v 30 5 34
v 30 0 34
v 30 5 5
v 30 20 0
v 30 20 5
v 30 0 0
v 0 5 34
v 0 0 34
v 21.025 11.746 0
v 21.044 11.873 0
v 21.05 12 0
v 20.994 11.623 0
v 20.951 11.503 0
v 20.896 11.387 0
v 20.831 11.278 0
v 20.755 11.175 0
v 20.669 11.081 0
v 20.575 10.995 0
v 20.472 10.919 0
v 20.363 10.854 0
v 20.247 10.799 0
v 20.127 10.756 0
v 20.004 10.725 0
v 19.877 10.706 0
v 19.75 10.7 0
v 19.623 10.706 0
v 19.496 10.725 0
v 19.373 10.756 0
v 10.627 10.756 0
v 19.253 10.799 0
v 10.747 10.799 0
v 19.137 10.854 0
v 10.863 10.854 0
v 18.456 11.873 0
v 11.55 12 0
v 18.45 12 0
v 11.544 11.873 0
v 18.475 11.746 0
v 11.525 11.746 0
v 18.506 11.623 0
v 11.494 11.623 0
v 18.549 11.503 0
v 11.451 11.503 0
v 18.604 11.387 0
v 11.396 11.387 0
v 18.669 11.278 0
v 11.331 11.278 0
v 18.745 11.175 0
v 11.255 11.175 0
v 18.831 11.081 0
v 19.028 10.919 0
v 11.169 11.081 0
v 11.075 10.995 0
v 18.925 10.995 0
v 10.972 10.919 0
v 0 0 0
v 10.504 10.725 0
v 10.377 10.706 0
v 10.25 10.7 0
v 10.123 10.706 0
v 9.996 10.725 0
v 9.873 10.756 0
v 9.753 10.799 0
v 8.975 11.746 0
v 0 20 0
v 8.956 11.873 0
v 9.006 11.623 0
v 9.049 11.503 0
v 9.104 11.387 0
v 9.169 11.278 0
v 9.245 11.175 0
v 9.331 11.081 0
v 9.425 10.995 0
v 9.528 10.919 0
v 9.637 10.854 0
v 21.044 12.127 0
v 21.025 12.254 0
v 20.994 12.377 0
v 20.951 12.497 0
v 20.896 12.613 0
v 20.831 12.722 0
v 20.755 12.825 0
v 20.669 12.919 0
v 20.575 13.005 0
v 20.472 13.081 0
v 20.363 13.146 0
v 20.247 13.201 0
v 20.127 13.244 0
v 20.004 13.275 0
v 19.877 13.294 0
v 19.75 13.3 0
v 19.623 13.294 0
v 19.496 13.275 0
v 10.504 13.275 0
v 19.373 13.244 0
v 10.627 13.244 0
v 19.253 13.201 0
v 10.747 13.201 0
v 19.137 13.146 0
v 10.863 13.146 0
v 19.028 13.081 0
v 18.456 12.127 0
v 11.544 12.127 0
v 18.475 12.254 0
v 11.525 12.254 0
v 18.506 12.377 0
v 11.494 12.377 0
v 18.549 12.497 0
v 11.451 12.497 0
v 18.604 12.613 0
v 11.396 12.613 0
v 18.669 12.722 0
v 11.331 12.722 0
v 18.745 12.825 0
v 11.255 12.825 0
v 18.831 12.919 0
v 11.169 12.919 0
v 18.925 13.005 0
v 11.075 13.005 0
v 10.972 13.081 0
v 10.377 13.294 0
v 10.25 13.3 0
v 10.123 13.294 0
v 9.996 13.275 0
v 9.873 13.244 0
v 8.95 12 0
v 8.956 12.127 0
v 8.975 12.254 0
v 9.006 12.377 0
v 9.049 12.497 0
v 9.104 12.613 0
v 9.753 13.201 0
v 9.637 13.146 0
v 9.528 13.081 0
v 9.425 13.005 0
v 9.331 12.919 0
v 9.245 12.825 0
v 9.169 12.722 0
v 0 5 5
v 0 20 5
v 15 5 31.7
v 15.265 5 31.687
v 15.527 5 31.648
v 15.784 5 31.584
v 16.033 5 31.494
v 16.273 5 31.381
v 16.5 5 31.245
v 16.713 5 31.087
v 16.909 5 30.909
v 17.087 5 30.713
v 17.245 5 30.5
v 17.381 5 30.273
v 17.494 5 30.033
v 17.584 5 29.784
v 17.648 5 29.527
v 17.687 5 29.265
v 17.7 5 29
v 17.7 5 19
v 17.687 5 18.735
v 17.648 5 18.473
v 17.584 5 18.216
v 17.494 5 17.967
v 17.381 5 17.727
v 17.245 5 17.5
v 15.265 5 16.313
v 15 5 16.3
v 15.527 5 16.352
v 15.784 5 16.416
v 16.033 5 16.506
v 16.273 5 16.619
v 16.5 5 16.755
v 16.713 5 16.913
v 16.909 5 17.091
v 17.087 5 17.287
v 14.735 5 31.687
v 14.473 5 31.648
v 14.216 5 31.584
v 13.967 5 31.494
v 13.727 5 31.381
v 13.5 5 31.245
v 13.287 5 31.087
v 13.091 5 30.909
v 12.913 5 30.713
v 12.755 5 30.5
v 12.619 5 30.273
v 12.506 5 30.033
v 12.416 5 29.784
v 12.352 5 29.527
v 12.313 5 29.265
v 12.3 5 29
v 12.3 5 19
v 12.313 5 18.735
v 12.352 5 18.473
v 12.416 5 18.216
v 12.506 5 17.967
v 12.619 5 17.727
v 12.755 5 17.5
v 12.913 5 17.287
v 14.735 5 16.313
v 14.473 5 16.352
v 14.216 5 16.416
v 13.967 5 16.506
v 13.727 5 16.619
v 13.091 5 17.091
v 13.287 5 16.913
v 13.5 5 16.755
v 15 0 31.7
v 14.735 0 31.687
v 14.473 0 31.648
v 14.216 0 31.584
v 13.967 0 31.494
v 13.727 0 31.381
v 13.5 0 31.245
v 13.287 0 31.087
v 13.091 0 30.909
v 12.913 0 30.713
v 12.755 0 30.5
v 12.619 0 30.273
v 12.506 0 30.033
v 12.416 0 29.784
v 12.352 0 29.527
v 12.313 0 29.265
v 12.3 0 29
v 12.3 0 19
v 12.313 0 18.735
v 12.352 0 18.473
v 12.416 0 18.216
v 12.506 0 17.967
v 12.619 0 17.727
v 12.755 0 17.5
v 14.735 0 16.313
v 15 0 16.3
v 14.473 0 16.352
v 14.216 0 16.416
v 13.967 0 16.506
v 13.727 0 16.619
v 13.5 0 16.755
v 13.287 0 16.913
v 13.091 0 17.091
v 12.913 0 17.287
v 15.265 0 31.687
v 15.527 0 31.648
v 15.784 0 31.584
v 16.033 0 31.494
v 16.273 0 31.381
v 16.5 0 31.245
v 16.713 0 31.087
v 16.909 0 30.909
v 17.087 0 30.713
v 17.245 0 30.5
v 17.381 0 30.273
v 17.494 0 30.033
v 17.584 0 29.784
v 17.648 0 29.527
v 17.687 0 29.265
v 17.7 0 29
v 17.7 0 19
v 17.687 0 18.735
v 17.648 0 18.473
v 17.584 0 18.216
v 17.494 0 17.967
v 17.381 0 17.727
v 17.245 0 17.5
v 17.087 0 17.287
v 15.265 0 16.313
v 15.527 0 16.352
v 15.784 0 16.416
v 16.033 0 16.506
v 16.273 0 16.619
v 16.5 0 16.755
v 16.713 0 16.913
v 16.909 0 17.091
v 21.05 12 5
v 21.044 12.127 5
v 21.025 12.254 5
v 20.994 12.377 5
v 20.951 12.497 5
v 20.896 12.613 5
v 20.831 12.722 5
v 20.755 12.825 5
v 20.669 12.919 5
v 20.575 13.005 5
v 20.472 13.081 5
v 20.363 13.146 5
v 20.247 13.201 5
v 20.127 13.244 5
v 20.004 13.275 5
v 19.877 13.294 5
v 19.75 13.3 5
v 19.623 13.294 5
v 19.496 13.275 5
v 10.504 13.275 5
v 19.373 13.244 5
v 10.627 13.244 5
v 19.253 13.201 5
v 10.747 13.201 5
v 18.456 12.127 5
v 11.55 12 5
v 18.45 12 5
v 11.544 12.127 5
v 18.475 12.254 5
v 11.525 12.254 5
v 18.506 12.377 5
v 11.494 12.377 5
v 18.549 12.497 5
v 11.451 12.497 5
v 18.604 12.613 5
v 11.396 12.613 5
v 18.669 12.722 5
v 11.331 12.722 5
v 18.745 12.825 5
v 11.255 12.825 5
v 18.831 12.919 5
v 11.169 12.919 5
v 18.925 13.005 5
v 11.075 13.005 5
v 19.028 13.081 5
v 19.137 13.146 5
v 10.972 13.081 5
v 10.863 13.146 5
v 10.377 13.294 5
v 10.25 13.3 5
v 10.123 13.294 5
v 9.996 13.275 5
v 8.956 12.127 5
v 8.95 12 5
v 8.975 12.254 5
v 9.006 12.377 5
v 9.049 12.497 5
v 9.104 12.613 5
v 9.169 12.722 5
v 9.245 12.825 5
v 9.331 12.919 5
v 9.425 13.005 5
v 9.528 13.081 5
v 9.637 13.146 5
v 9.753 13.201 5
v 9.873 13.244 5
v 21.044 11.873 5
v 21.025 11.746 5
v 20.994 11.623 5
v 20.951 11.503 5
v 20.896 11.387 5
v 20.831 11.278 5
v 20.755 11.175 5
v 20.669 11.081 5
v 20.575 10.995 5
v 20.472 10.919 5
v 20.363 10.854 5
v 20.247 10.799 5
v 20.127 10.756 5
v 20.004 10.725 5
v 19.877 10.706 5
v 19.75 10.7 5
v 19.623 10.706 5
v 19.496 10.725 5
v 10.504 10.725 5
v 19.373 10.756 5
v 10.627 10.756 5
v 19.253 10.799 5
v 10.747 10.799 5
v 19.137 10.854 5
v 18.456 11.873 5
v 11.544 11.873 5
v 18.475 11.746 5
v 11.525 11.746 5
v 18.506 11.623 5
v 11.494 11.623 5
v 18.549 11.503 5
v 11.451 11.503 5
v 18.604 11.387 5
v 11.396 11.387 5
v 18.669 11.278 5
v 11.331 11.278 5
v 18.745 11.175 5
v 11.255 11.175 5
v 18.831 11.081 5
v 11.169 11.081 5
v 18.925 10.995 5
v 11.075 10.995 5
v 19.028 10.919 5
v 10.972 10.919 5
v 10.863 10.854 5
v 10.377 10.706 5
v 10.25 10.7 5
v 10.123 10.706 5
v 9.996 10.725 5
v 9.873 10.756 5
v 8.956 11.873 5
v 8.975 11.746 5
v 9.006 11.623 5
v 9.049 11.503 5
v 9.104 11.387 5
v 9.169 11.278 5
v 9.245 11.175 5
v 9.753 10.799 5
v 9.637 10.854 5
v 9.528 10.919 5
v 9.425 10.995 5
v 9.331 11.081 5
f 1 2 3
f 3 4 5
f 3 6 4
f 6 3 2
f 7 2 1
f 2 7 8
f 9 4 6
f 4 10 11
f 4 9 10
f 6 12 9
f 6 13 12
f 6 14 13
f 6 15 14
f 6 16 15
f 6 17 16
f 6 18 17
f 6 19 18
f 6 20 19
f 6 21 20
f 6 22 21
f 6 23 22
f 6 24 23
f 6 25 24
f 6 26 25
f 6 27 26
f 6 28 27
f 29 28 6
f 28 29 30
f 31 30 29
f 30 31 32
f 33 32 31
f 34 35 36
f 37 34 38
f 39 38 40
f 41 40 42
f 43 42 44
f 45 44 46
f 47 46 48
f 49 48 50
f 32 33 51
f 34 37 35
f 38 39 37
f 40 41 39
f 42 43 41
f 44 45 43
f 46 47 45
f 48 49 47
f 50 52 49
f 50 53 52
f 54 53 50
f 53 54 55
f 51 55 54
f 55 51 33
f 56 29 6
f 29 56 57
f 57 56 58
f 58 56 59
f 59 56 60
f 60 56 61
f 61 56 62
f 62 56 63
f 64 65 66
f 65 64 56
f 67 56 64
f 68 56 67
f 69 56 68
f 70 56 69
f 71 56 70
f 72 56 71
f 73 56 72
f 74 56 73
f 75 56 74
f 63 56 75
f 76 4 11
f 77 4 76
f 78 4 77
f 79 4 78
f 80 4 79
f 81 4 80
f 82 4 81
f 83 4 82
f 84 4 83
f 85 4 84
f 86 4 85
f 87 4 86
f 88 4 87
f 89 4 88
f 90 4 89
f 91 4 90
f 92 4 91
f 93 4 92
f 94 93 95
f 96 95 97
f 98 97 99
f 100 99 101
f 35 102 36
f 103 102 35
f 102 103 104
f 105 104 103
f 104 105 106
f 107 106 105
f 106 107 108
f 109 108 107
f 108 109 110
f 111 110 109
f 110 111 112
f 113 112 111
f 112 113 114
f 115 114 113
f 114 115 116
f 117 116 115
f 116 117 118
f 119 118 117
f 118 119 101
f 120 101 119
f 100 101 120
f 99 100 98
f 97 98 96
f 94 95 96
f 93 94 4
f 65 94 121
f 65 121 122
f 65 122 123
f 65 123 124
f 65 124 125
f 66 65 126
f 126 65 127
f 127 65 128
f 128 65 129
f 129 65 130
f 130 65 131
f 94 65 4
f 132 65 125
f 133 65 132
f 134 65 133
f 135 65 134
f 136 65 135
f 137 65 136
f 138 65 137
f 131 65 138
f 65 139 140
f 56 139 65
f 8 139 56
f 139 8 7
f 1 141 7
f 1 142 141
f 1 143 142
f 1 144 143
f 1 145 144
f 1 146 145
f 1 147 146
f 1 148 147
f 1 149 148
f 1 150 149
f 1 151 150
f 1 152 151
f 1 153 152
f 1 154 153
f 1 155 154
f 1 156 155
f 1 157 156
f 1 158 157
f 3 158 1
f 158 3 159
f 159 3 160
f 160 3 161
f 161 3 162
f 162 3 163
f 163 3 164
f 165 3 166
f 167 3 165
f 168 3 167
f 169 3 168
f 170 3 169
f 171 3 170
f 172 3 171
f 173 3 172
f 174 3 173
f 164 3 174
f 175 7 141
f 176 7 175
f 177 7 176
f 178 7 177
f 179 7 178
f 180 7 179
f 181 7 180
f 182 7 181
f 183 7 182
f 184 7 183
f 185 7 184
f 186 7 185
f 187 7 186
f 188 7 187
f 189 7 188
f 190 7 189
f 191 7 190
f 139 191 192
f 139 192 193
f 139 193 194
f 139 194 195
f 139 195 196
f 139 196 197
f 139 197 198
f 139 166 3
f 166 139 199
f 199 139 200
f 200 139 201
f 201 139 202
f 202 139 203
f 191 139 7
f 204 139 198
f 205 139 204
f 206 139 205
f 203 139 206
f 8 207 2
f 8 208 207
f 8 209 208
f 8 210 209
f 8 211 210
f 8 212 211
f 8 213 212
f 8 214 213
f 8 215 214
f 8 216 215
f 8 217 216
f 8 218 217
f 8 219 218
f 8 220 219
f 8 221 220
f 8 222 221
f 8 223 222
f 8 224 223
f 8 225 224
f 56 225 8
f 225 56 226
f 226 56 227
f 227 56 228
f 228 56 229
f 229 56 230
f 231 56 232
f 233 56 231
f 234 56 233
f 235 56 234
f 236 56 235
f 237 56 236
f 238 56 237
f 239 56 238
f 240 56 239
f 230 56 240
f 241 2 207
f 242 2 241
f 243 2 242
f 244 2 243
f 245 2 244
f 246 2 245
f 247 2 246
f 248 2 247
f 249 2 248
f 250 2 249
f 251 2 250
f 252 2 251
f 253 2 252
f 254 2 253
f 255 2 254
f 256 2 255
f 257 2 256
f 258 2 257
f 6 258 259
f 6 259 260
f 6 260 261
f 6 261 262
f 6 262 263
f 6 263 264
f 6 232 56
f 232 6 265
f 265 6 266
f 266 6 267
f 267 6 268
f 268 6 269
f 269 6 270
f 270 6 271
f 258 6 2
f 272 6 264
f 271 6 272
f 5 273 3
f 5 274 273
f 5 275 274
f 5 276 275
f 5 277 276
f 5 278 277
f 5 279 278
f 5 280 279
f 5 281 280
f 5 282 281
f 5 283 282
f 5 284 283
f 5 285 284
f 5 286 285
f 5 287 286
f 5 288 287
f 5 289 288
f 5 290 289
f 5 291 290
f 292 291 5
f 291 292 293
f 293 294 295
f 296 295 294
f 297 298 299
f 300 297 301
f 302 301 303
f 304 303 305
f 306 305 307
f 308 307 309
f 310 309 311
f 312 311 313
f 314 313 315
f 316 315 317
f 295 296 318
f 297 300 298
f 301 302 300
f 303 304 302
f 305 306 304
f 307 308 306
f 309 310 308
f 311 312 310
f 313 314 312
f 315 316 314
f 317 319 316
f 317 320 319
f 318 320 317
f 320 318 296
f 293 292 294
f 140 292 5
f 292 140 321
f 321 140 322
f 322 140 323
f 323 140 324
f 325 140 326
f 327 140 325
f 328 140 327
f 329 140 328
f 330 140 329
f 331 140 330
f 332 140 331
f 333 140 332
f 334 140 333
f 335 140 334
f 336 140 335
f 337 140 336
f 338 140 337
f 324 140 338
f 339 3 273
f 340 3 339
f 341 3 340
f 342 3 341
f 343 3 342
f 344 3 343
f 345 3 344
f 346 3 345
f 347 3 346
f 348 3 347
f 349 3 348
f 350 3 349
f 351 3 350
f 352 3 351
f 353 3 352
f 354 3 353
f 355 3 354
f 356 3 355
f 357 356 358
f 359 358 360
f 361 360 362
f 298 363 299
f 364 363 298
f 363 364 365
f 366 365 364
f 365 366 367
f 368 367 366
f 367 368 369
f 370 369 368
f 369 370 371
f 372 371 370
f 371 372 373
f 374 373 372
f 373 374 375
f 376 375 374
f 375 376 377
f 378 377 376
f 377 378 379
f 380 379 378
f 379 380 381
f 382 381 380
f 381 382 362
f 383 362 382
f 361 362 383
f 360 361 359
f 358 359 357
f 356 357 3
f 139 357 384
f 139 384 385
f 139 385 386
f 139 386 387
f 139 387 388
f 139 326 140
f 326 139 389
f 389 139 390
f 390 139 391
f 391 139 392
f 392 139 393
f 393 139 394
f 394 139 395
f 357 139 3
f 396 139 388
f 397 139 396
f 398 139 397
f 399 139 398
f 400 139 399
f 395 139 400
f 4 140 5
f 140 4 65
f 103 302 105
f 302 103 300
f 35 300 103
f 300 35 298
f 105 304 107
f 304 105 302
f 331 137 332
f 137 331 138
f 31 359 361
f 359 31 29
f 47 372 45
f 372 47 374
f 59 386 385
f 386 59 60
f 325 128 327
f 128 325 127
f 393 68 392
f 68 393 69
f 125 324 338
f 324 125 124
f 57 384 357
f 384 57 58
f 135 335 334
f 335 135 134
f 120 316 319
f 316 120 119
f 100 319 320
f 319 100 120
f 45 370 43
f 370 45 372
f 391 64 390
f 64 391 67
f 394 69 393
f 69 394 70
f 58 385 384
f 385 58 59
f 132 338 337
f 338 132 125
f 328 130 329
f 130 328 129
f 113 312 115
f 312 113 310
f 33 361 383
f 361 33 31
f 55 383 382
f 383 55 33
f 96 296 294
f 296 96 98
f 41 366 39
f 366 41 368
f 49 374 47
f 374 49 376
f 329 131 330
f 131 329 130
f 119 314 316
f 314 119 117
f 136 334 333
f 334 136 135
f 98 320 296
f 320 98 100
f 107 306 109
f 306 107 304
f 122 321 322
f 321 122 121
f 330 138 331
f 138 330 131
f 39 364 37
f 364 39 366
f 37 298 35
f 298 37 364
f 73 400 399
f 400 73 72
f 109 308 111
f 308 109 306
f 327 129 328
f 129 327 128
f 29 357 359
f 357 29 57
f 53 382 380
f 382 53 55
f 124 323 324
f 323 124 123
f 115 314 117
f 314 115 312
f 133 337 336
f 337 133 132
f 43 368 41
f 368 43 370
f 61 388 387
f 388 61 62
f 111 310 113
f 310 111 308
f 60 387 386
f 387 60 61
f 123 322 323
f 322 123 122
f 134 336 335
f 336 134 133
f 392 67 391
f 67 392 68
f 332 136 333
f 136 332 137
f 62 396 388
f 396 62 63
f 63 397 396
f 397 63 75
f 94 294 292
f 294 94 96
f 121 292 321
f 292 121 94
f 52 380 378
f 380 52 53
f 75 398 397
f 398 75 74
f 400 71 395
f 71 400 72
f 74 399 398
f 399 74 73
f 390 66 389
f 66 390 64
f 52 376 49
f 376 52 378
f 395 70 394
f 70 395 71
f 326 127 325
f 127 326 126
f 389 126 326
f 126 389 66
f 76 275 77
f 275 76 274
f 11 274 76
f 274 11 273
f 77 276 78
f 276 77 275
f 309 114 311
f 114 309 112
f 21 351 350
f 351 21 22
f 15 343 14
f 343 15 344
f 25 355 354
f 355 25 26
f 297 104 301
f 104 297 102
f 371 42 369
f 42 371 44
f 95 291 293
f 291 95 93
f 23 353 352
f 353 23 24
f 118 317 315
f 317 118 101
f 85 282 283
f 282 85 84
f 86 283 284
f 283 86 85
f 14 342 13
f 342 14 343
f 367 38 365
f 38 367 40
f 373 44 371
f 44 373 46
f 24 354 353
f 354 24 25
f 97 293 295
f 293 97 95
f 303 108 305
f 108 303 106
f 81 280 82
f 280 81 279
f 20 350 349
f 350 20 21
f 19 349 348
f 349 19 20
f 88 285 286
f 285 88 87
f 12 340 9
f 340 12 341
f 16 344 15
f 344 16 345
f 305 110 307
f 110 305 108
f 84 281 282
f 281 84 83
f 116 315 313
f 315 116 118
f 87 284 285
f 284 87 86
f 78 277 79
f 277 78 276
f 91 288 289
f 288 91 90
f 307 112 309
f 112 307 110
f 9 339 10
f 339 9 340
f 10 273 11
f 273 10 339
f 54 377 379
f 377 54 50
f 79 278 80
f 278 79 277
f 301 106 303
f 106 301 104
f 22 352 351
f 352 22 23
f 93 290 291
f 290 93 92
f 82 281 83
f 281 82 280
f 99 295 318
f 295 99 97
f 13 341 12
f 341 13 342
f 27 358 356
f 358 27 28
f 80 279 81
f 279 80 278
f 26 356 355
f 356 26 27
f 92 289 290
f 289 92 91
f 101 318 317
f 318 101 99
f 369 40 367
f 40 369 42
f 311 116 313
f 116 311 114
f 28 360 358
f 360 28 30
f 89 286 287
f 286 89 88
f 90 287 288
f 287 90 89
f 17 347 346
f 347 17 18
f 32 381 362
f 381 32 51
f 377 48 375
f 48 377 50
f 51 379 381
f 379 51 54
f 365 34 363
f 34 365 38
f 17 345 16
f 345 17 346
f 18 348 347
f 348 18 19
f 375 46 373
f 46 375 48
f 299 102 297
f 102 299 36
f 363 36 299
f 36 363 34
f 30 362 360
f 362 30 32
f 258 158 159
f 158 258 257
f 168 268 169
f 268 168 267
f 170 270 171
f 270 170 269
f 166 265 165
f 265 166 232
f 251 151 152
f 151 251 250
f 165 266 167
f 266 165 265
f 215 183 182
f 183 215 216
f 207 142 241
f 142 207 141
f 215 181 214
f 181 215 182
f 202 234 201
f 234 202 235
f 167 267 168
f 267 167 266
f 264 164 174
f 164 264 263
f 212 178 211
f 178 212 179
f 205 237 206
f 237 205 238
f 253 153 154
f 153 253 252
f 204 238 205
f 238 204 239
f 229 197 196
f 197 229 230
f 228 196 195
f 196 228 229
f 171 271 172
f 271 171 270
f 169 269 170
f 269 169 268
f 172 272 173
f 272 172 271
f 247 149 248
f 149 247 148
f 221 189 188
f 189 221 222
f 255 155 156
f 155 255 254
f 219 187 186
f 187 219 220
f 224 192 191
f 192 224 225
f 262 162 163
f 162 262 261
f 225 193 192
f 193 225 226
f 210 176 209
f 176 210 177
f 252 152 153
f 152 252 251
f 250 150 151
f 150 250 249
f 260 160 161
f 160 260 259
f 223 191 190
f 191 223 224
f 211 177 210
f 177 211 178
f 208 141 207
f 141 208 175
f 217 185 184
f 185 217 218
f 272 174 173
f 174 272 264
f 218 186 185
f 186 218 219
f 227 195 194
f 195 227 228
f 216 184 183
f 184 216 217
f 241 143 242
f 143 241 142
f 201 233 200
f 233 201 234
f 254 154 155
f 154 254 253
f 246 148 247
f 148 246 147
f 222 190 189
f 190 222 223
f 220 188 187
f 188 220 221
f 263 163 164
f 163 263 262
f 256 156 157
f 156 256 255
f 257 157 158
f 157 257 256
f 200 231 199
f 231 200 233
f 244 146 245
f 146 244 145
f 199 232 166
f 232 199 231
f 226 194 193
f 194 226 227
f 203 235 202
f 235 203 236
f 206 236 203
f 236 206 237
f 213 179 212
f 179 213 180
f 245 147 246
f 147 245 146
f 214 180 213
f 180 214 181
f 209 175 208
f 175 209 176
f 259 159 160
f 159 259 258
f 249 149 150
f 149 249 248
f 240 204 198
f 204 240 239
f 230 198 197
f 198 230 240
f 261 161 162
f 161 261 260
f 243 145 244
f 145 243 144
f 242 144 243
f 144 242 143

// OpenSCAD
// file: params.scad
// ArtBot - shared parameters for all printed parts. Units: mm.
// Anything tagged VERIFY must be measured against the parts actually ordered
// before you burn filament on a full set.

$fn = 64;
eps = 0.01;

/* ---------- fasteners (clearance holes, not tapped) ---------- */
m2_clear   = 2.4;
m3_clear   = 3.4;
m3_nut_af  = 5.6;   // across flats
m3_nut_t   = 2.6;
m5_clear   = 5.4;
m5_head_d  = 9.6;
m5_head_h  = 5.2;

/* ---------- V-slot extrusion ---------- */
vslot      = 20;    // 2020 face width
vslot_2040 = 40;    // 2040 long face

/* ---------- gantry plate bolt grid ----------
   OpenBuilds Mini-V / Xtreme plates all use a 20 mm M5 grid.
   VERIFY the actual hole positions on the plate you buy - vendors differ
   on WHICH grid holes are present, not on the pitch.                      */
plate_grid = 20;

/* ---------- GT2 belt ---------- */
belt_w      = 6;
belt_pitch  = 2;
belt_back   = 0.80;  // thickness behind the teeth
belt_tooth  = 0.75;  // tooth depth

/* ---------- pen shuttle guide rods ---------- */
rod_d       = 8;
rod_press   = 7.85;  // interference fit in the fixed walls (tune per printer)
rod_slide   = 8.5;   // running clearance in the moving shuttle
rod_spacing = 40;    // centre-to-centre, horizontal
rod_len     = 74;    // cut length. base plate + span + front wall

/* ---------- whiteboard marker ---------- */
pen_d       = 17;    // VERIFY: calliper the barrel of the marker you'll use
pen_clear_d = 24;    // pass-through in the front wall

/* ---------- SG90 servo ----------
   Mount holes are SLOTTED in servo_bracket_sg90.scad on purpose: SG90 clones
   vary by ~1 mm and the throw needs fore/aft trimming at assembly anyway.   */
sg90_len     = 23.0;
sg90_wid     = 12.4;
sg90_hgt     = 22.6;
sg90_tab_span = 32.2;  // screw centre to screw centre
sg90_tab_t    = 2.6;
sg90_screw_d  = 2.4;

/* ---------- limit switch (V-153 / KW12 style lever microswitch) ---------- */
sw_hole_pitch = 9.5;  // VERIFY against your switch
sw_hole_d     = 2.6;
// main file
// ArtBot - limit switch mount for 2020 extrusion. Qty 2 (X-min, Y-min).
// Slotted so you can slide the trigger point during homing setup without
// re-drilling anything.
include <params.scad>

ms_w = 30;
ms_t = 5;
ms_h = 34;

module slot(len, d, h) {
    hull() for (o = [-len/2, len/2]) translate([o, 0, 0]) cylinder(d = d, h = h);
}

difference() {
    union() {
        cube([ms_w, ms_t, ms_h]);
        cube([ms_w, 20, ms_t]);   // switch shelf
    }

    // M5 into the extrusion slot, slotted vertically for position trim
    translate([ms_w/2, -eps, ms_h - 10]) rotate([-90, 0, 0])
        rotate([0, 0, 90]) slot(10, m5_clear, ms_t + 2*eps);

    // switch screws
    for (x = [ms_w/2 - sw_hole_pitch/2, ms_w/2 + sw_hole_pitch/2])
        translate([x, 12, -eps]) cylinder(d = sw_hole_d, h = ms_t + 2*eps);
}

// PRINT: flat, 3 perimeters, 30% infill, no supports.
